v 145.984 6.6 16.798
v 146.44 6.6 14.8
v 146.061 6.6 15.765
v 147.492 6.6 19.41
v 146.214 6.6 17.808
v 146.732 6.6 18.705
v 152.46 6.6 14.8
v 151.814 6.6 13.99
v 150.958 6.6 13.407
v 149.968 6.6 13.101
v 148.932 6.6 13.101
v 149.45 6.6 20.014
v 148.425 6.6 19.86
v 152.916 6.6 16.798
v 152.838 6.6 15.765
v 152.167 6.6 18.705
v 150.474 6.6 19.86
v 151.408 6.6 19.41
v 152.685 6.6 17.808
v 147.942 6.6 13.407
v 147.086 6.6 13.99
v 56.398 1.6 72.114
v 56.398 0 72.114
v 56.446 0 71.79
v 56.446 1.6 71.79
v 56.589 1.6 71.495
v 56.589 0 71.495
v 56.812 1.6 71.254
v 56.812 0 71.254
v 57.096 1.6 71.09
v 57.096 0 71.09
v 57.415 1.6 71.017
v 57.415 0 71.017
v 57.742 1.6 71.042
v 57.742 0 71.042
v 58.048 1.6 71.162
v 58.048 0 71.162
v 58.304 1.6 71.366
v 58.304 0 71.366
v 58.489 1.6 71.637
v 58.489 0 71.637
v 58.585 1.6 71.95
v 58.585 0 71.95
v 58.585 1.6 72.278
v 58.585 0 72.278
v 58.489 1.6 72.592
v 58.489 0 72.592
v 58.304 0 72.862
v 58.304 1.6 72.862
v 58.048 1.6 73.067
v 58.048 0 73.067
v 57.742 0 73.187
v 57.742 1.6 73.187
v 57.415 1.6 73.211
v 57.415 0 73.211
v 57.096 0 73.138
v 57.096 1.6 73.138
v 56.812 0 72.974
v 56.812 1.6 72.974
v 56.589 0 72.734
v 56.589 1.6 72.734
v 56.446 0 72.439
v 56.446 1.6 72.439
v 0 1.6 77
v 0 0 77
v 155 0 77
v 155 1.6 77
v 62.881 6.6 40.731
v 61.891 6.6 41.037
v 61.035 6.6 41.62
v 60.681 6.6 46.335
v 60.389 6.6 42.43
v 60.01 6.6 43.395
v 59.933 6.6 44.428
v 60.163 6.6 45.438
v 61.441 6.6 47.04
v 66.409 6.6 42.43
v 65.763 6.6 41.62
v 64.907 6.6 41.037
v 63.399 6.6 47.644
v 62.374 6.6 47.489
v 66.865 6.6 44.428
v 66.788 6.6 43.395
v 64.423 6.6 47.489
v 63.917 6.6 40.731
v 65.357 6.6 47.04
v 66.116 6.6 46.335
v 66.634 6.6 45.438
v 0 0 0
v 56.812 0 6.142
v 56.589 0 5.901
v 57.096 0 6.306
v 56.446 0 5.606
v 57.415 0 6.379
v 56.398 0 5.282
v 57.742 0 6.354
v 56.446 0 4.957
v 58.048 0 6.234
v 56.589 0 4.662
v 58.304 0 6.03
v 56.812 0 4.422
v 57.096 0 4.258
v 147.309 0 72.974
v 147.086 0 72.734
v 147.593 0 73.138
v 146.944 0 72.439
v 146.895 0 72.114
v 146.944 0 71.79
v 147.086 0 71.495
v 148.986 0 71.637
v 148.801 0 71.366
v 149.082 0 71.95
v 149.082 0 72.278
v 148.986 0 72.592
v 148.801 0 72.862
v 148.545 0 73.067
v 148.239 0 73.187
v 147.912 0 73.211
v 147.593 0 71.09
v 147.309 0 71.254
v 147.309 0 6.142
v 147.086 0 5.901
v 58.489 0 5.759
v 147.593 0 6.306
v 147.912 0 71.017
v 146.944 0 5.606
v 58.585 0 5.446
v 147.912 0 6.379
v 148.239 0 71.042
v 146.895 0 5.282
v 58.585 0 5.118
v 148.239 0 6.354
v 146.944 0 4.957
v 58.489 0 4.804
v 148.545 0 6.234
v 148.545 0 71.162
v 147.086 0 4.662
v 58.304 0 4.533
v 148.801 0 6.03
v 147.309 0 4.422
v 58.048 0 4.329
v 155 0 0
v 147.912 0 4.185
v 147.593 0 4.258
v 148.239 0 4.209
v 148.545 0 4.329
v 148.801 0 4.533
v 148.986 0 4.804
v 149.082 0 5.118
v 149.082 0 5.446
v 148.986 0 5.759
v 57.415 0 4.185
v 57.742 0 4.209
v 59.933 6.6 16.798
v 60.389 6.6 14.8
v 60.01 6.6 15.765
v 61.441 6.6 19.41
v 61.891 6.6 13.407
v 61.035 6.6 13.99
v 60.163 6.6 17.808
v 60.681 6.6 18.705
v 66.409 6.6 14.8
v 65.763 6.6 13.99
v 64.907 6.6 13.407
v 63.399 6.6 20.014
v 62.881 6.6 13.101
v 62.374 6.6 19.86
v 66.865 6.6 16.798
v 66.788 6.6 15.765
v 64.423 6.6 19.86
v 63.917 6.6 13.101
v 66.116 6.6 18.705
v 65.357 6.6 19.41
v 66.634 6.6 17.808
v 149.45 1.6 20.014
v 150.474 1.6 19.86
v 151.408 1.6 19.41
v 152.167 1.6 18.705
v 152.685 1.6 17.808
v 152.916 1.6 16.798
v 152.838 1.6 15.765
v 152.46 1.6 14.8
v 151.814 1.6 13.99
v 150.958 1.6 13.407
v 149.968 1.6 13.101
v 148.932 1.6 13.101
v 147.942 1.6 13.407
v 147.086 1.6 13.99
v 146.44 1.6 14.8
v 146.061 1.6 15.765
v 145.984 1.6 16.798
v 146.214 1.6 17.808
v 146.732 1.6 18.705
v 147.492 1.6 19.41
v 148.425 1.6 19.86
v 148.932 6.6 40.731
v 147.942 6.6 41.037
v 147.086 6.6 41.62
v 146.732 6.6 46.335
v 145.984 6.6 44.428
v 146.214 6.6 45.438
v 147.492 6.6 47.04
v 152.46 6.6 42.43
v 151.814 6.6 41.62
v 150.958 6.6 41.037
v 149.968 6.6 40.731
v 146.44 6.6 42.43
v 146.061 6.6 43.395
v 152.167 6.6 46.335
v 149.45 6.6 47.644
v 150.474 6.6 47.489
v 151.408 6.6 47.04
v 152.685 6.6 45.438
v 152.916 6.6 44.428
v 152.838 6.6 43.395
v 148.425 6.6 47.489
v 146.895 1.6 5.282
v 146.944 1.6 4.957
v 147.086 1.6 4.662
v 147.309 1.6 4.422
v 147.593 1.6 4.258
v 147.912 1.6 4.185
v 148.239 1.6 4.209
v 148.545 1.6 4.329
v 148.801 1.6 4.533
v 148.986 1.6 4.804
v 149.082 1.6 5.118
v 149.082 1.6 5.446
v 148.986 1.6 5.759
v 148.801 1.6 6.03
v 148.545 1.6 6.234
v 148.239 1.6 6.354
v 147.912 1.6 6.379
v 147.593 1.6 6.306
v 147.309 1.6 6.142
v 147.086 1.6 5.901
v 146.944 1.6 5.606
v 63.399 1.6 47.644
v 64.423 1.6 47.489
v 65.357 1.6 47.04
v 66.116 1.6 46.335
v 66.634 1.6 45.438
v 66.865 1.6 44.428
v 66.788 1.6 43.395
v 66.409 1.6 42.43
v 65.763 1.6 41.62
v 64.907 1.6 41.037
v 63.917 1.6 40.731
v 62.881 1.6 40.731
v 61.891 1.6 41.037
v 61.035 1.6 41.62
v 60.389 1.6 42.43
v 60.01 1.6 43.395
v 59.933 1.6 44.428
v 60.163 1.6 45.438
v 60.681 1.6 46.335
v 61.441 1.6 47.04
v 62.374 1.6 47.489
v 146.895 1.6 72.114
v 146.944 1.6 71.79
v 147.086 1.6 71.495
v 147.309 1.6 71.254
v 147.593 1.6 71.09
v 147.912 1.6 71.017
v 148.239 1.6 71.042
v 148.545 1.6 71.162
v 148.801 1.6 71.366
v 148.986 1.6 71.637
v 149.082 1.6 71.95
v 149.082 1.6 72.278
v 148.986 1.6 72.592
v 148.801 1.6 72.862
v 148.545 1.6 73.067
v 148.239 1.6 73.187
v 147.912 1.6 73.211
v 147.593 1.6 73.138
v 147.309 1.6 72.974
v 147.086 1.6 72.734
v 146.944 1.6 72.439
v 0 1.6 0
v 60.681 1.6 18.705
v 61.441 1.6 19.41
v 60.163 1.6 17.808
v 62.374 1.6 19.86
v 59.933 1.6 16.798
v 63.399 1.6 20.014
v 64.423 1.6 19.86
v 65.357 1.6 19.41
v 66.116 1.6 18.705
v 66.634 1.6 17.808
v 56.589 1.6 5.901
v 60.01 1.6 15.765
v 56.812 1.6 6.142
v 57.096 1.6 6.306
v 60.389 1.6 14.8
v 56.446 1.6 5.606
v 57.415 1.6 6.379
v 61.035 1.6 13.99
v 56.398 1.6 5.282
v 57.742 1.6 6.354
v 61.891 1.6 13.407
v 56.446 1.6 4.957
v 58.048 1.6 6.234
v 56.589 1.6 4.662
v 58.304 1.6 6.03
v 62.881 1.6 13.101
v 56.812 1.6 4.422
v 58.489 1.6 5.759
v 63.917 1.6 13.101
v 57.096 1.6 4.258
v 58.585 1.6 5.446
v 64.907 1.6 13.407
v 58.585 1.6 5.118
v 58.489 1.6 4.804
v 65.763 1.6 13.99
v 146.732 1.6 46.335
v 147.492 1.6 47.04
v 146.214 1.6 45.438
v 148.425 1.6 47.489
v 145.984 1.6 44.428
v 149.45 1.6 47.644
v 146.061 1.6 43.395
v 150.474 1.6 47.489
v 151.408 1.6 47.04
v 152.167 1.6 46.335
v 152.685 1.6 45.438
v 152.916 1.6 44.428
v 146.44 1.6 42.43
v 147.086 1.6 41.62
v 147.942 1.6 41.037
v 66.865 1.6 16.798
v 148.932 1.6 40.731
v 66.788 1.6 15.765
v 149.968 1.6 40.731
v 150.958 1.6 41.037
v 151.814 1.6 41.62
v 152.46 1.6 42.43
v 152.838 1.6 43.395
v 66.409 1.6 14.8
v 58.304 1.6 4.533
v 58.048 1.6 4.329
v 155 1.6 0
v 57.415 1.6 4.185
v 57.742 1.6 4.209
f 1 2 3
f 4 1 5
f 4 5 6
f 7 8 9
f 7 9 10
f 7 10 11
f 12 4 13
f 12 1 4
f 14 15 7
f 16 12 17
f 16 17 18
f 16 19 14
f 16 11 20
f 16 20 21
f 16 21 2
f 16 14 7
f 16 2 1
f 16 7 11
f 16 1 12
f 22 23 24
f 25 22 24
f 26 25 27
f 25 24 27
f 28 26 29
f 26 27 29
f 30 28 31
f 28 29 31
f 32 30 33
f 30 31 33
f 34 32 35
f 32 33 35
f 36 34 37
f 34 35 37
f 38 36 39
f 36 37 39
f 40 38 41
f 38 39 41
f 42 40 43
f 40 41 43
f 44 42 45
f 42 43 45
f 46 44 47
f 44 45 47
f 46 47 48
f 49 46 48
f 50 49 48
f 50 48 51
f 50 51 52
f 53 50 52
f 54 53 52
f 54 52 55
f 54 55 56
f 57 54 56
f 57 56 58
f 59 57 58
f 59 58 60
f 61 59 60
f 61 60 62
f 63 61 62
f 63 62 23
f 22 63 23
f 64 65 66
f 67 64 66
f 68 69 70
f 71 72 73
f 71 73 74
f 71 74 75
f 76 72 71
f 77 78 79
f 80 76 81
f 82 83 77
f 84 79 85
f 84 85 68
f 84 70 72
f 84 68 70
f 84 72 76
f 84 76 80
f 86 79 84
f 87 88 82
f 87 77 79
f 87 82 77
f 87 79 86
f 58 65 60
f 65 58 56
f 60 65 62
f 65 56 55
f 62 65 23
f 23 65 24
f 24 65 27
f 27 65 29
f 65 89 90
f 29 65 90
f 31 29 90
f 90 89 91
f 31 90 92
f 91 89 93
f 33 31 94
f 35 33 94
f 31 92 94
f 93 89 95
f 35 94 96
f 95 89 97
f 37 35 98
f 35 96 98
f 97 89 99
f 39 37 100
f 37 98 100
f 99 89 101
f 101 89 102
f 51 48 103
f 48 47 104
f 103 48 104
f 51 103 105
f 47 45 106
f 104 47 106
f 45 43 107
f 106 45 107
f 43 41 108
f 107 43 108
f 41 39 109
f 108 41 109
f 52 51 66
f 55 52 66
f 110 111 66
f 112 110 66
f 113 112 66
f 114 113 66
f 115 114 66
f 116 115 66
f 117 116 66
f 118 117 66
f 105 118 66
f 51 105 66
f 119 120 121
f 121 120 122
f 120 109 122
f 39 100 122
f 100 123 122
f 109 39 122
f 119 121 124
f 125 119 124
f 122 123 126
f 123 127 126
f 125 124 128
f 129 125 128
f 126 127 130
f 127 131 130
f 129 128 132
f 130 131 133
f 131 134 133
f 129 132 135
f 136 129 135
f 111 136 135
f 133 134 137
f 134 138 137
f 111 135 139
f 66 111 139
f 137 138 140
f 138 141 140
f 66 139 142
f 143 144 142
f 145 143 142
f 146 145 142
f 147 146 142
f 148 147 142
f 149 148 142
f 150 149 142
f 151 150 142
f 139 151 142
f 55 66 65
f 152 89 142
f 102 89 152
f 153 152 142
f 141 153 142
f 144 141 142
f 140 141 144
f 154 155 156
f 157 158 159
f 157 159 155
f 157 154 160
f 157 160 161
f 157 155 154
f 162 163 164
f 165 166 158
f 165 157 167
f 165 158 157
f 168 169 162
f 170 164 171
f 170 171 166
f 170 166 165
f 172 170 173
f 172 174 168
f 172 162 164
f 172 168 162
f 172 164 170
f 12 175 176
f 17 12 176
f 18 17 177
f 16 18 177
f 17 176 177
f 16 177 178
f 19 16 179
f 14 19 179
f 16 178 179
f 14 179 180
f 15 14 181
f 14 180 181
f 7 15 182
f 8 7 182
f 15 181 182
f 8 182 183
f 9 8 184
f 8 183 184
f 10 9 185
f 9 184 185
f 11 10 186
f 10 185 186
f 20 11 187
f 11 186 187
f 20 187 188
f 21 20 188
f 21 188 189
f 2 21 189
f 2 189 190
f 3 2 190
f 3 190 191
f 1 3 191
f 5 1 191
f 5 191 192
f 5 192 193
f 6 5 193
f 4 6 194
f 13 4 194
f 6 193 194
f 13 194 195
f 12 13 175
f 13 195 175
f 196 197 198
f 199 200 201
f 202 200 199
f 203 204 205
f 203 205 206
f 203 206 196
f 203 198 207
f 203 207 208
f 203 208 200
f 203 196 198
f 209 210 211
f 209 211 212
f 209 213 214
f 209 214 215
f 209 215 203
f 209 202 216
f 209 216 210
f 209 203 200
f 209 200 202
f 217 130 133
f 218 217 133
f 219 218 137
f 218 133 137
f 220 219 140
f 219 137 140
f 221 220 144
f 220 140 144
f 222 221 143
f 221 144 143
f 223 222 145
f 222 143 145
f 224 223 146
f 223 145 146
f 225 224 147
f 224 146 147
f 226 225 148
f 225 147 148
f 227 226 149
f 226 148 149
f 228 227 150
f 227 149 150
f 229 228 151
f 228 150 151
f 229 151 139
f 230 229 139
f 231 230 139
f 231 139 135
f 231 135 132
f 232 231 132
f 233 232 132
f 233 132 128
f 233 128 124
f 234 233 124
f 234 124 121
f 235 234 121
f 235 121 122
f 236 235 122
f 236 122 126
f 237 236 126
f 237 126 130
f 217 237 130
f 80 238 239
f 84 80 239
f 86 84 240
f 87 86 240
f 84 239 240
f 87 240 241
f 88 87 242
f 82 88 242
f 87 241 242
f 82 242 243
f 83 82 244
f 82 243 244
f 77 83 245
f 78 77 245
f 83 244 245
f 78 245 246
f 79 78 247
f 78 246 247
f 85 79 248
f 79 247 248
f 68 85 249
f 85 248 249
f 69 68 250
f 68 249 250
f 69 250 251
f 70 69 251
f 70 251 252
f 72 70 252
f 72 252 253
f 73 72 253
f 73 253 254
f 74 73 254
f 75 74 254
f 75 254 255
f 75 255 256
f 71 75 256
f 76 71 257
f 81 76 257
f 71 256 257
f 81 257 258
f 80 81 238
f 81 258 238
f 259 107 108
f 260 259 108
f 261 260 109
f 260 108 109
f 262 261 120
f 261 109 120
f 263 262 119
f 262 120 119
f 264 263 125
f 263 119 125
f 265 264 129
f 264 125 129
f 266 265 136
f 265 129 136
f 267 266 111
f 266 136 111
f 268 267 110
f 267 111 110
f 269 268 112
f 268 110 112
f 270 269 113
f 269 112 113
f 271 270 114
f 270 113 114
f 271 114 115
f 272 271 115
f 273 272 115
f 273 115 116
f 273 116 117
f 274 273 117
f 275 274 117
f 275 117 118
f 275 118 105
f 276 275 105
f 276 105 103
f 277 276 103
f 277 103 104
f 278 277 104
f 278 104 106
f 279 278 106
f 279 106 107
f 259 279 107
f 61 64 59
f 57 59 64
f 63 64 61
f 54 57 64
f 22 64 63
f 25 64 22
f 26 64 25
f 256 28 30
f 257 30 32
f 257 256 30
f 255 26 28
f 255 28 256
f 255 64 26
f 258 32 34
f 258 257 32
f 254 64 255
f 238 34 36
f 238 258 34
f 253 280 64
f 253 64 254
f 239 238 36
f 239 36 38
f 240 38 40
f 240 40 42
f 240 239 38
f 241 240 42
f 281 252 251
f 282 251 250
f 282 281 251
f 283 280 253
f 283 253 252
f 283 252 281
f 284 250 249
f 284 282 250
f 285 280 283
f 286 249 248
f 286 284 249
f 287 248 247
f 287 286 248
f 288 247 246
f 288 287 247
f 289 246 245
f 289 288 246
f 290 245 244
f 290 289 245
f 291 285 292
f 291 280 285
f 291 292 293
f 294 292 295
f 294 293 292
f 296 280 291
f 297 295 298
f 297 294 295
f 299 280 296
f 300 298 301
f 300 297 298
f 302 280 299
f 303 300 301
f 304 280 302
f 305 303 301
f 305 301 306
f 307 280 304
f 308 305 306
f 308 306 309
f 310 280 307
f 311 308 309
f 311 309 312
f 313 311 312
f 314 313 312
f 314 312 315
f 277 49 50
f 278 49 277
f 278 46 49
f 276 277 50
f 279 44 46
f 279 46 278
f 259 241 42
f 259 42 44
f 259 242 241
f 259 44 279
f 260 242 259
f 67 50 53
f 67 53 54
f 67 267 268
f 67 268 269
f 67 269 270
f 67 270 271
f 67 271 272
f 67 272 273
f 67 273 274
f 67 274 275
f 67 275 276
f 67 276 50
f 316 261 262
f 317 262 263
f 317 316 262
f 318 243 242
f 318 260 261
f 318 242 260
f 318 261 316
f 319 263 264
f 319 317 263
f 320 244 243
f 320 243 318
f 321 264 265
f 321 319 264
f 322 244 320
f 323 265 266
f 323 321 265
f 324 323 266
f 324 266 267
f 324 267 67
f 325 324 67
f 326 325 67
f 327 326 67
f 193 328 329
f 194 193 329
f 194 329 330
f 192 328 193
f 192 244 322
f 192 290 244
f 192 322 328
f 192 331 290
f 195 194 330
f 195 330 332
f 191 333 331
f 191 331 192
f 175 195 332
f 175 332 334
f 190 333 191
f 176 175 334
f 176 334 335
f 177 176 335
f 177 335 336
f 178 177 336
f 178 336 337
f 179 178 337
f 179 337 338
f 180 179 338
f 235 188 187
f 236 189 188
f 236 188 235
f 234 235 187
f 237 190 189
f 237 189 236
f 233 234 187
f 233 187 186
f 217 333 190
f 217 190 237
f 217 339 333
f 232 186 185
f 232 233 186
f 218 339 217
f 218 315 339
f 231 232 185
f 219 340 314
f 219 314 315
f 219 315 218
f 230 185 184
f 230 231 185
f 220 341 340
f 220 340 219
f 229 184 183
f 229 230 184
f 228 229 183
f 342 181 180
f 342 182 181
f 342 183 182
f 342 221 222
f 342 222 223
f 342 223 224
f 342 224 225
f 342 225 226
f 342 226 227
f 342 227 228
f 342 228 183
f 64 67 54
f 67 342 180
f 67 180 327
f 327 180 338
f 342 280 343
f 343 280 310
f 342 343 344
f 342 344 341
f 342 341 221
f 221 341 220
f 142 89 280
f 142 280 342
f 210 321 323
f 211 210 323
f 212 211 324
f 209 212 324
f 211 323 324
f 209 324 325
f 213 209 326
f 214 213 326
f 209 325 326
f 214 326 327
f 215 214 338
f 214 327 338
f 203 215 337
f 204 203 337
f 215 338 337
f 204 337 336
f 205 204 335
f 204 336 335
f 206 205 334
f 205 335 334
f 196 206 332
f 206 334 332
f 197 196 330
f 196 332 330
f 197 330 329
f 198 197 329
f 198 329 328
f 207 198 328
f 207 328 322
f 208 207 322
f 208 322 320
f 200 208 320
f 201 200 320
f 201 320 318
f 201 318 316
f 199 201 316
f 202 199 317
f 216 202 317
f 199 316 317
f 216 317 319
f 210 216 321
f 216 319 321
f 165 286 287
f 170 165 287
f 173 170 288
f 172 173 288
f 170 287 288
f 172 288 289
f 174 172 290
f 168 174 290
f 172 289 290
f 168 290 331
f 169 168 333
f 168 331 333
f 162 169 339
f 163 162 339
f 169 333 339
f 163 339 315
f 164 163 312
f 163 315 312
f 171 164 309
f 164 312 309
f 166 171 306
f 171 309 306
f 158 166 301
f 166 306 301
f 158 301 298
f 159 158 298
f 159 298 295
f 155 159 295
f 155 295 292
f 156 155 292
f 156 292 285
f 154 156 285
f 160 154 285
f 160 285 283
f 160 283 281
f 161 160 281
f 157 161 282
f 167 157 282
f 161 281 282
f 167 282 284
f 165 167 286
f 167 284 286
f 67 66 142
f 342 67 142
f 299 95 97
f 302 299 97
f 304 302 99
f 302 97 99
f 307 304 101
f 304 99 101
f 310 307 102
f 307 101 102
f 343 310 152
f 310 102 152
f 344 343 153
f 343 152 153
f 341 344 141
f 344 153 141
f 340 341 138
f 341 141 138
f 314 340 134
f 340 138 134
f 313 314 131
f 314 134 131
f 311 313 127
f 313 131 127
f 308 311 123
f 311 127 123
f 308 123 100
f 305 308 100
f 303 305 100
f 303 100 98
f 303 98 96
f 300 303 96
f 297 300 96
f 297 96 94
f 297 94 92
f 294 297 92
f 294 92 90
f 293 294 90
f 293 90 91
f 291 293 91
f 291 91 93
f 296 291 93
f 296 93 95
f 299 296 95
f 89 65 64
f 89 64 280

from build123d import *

# Parameters (mm, degrees)
SKETCH1_W            = 155
SKETCH1_H            = 77
BOSS_EXTRUDE1_DEPTH  = 1.6
SKETCH2_R            = 3.47579735
BOSS_EXTRUDE3_DEPTH  = 5
M2_CLEARANCE_HOLE1_D = 2.2


with BuildPart() as part:
    # Sketch1 → Boss-Extrude1 (new body)
    with BuildSketch(Plane(origin=(0, 0, 0), x_dir=(1, 0, 0), z_dir=(0, 1, 0))):
        with Locations((77.5, -38.5)):
            Rectangle(SKETCH1_W, SKETCH1_H)
    extrude(amount=BOSS_EXTRUDE1_DEPTH)

    # Sketch2 → Boss-Extrude3 (add)
    with BuildSketch(Plane(origin=(0, 1.6, 0), x_dir=(1, 0, 0), z_dir=(0, 1, 0))):
        with Locations(Location((63.398865642, -16.538313278, 0), (0, 0, 270))):
            Circle(SKETCH2_R)
        with Locations(Location((63.398865642, -44.168086722, 0), (0, 0, 270))):
            Circle(SKETCH2_R)
        with Locations(Location((149.449734358, -16.538313278, 0), (0, 0, 270))):
            Circle(SKETCH2_R)
        with Locations(Location((149.449734358, -44.168086722, 0), (0, 0, 270))):
            Circle(SKETCH2_R)
    extrude(amount=BOSS_EXTRUDE3_DEPTH)

    # M2 Clearance Hole1 (through all)
    with Locations(Plane(origin=(0, 1.6, 0), x_dir=(1, 0, 0), z_dir=(0, 1, 0))):
        with Locations((147.994644581, -5.281684189), (147.994644581, -72.114274551), (57.497596152, -72.114274551), (57.497596152, -5.281684189)):
            Hole(M2_CLEARANCE_HOLE1_D / 2)


solid = part.part
